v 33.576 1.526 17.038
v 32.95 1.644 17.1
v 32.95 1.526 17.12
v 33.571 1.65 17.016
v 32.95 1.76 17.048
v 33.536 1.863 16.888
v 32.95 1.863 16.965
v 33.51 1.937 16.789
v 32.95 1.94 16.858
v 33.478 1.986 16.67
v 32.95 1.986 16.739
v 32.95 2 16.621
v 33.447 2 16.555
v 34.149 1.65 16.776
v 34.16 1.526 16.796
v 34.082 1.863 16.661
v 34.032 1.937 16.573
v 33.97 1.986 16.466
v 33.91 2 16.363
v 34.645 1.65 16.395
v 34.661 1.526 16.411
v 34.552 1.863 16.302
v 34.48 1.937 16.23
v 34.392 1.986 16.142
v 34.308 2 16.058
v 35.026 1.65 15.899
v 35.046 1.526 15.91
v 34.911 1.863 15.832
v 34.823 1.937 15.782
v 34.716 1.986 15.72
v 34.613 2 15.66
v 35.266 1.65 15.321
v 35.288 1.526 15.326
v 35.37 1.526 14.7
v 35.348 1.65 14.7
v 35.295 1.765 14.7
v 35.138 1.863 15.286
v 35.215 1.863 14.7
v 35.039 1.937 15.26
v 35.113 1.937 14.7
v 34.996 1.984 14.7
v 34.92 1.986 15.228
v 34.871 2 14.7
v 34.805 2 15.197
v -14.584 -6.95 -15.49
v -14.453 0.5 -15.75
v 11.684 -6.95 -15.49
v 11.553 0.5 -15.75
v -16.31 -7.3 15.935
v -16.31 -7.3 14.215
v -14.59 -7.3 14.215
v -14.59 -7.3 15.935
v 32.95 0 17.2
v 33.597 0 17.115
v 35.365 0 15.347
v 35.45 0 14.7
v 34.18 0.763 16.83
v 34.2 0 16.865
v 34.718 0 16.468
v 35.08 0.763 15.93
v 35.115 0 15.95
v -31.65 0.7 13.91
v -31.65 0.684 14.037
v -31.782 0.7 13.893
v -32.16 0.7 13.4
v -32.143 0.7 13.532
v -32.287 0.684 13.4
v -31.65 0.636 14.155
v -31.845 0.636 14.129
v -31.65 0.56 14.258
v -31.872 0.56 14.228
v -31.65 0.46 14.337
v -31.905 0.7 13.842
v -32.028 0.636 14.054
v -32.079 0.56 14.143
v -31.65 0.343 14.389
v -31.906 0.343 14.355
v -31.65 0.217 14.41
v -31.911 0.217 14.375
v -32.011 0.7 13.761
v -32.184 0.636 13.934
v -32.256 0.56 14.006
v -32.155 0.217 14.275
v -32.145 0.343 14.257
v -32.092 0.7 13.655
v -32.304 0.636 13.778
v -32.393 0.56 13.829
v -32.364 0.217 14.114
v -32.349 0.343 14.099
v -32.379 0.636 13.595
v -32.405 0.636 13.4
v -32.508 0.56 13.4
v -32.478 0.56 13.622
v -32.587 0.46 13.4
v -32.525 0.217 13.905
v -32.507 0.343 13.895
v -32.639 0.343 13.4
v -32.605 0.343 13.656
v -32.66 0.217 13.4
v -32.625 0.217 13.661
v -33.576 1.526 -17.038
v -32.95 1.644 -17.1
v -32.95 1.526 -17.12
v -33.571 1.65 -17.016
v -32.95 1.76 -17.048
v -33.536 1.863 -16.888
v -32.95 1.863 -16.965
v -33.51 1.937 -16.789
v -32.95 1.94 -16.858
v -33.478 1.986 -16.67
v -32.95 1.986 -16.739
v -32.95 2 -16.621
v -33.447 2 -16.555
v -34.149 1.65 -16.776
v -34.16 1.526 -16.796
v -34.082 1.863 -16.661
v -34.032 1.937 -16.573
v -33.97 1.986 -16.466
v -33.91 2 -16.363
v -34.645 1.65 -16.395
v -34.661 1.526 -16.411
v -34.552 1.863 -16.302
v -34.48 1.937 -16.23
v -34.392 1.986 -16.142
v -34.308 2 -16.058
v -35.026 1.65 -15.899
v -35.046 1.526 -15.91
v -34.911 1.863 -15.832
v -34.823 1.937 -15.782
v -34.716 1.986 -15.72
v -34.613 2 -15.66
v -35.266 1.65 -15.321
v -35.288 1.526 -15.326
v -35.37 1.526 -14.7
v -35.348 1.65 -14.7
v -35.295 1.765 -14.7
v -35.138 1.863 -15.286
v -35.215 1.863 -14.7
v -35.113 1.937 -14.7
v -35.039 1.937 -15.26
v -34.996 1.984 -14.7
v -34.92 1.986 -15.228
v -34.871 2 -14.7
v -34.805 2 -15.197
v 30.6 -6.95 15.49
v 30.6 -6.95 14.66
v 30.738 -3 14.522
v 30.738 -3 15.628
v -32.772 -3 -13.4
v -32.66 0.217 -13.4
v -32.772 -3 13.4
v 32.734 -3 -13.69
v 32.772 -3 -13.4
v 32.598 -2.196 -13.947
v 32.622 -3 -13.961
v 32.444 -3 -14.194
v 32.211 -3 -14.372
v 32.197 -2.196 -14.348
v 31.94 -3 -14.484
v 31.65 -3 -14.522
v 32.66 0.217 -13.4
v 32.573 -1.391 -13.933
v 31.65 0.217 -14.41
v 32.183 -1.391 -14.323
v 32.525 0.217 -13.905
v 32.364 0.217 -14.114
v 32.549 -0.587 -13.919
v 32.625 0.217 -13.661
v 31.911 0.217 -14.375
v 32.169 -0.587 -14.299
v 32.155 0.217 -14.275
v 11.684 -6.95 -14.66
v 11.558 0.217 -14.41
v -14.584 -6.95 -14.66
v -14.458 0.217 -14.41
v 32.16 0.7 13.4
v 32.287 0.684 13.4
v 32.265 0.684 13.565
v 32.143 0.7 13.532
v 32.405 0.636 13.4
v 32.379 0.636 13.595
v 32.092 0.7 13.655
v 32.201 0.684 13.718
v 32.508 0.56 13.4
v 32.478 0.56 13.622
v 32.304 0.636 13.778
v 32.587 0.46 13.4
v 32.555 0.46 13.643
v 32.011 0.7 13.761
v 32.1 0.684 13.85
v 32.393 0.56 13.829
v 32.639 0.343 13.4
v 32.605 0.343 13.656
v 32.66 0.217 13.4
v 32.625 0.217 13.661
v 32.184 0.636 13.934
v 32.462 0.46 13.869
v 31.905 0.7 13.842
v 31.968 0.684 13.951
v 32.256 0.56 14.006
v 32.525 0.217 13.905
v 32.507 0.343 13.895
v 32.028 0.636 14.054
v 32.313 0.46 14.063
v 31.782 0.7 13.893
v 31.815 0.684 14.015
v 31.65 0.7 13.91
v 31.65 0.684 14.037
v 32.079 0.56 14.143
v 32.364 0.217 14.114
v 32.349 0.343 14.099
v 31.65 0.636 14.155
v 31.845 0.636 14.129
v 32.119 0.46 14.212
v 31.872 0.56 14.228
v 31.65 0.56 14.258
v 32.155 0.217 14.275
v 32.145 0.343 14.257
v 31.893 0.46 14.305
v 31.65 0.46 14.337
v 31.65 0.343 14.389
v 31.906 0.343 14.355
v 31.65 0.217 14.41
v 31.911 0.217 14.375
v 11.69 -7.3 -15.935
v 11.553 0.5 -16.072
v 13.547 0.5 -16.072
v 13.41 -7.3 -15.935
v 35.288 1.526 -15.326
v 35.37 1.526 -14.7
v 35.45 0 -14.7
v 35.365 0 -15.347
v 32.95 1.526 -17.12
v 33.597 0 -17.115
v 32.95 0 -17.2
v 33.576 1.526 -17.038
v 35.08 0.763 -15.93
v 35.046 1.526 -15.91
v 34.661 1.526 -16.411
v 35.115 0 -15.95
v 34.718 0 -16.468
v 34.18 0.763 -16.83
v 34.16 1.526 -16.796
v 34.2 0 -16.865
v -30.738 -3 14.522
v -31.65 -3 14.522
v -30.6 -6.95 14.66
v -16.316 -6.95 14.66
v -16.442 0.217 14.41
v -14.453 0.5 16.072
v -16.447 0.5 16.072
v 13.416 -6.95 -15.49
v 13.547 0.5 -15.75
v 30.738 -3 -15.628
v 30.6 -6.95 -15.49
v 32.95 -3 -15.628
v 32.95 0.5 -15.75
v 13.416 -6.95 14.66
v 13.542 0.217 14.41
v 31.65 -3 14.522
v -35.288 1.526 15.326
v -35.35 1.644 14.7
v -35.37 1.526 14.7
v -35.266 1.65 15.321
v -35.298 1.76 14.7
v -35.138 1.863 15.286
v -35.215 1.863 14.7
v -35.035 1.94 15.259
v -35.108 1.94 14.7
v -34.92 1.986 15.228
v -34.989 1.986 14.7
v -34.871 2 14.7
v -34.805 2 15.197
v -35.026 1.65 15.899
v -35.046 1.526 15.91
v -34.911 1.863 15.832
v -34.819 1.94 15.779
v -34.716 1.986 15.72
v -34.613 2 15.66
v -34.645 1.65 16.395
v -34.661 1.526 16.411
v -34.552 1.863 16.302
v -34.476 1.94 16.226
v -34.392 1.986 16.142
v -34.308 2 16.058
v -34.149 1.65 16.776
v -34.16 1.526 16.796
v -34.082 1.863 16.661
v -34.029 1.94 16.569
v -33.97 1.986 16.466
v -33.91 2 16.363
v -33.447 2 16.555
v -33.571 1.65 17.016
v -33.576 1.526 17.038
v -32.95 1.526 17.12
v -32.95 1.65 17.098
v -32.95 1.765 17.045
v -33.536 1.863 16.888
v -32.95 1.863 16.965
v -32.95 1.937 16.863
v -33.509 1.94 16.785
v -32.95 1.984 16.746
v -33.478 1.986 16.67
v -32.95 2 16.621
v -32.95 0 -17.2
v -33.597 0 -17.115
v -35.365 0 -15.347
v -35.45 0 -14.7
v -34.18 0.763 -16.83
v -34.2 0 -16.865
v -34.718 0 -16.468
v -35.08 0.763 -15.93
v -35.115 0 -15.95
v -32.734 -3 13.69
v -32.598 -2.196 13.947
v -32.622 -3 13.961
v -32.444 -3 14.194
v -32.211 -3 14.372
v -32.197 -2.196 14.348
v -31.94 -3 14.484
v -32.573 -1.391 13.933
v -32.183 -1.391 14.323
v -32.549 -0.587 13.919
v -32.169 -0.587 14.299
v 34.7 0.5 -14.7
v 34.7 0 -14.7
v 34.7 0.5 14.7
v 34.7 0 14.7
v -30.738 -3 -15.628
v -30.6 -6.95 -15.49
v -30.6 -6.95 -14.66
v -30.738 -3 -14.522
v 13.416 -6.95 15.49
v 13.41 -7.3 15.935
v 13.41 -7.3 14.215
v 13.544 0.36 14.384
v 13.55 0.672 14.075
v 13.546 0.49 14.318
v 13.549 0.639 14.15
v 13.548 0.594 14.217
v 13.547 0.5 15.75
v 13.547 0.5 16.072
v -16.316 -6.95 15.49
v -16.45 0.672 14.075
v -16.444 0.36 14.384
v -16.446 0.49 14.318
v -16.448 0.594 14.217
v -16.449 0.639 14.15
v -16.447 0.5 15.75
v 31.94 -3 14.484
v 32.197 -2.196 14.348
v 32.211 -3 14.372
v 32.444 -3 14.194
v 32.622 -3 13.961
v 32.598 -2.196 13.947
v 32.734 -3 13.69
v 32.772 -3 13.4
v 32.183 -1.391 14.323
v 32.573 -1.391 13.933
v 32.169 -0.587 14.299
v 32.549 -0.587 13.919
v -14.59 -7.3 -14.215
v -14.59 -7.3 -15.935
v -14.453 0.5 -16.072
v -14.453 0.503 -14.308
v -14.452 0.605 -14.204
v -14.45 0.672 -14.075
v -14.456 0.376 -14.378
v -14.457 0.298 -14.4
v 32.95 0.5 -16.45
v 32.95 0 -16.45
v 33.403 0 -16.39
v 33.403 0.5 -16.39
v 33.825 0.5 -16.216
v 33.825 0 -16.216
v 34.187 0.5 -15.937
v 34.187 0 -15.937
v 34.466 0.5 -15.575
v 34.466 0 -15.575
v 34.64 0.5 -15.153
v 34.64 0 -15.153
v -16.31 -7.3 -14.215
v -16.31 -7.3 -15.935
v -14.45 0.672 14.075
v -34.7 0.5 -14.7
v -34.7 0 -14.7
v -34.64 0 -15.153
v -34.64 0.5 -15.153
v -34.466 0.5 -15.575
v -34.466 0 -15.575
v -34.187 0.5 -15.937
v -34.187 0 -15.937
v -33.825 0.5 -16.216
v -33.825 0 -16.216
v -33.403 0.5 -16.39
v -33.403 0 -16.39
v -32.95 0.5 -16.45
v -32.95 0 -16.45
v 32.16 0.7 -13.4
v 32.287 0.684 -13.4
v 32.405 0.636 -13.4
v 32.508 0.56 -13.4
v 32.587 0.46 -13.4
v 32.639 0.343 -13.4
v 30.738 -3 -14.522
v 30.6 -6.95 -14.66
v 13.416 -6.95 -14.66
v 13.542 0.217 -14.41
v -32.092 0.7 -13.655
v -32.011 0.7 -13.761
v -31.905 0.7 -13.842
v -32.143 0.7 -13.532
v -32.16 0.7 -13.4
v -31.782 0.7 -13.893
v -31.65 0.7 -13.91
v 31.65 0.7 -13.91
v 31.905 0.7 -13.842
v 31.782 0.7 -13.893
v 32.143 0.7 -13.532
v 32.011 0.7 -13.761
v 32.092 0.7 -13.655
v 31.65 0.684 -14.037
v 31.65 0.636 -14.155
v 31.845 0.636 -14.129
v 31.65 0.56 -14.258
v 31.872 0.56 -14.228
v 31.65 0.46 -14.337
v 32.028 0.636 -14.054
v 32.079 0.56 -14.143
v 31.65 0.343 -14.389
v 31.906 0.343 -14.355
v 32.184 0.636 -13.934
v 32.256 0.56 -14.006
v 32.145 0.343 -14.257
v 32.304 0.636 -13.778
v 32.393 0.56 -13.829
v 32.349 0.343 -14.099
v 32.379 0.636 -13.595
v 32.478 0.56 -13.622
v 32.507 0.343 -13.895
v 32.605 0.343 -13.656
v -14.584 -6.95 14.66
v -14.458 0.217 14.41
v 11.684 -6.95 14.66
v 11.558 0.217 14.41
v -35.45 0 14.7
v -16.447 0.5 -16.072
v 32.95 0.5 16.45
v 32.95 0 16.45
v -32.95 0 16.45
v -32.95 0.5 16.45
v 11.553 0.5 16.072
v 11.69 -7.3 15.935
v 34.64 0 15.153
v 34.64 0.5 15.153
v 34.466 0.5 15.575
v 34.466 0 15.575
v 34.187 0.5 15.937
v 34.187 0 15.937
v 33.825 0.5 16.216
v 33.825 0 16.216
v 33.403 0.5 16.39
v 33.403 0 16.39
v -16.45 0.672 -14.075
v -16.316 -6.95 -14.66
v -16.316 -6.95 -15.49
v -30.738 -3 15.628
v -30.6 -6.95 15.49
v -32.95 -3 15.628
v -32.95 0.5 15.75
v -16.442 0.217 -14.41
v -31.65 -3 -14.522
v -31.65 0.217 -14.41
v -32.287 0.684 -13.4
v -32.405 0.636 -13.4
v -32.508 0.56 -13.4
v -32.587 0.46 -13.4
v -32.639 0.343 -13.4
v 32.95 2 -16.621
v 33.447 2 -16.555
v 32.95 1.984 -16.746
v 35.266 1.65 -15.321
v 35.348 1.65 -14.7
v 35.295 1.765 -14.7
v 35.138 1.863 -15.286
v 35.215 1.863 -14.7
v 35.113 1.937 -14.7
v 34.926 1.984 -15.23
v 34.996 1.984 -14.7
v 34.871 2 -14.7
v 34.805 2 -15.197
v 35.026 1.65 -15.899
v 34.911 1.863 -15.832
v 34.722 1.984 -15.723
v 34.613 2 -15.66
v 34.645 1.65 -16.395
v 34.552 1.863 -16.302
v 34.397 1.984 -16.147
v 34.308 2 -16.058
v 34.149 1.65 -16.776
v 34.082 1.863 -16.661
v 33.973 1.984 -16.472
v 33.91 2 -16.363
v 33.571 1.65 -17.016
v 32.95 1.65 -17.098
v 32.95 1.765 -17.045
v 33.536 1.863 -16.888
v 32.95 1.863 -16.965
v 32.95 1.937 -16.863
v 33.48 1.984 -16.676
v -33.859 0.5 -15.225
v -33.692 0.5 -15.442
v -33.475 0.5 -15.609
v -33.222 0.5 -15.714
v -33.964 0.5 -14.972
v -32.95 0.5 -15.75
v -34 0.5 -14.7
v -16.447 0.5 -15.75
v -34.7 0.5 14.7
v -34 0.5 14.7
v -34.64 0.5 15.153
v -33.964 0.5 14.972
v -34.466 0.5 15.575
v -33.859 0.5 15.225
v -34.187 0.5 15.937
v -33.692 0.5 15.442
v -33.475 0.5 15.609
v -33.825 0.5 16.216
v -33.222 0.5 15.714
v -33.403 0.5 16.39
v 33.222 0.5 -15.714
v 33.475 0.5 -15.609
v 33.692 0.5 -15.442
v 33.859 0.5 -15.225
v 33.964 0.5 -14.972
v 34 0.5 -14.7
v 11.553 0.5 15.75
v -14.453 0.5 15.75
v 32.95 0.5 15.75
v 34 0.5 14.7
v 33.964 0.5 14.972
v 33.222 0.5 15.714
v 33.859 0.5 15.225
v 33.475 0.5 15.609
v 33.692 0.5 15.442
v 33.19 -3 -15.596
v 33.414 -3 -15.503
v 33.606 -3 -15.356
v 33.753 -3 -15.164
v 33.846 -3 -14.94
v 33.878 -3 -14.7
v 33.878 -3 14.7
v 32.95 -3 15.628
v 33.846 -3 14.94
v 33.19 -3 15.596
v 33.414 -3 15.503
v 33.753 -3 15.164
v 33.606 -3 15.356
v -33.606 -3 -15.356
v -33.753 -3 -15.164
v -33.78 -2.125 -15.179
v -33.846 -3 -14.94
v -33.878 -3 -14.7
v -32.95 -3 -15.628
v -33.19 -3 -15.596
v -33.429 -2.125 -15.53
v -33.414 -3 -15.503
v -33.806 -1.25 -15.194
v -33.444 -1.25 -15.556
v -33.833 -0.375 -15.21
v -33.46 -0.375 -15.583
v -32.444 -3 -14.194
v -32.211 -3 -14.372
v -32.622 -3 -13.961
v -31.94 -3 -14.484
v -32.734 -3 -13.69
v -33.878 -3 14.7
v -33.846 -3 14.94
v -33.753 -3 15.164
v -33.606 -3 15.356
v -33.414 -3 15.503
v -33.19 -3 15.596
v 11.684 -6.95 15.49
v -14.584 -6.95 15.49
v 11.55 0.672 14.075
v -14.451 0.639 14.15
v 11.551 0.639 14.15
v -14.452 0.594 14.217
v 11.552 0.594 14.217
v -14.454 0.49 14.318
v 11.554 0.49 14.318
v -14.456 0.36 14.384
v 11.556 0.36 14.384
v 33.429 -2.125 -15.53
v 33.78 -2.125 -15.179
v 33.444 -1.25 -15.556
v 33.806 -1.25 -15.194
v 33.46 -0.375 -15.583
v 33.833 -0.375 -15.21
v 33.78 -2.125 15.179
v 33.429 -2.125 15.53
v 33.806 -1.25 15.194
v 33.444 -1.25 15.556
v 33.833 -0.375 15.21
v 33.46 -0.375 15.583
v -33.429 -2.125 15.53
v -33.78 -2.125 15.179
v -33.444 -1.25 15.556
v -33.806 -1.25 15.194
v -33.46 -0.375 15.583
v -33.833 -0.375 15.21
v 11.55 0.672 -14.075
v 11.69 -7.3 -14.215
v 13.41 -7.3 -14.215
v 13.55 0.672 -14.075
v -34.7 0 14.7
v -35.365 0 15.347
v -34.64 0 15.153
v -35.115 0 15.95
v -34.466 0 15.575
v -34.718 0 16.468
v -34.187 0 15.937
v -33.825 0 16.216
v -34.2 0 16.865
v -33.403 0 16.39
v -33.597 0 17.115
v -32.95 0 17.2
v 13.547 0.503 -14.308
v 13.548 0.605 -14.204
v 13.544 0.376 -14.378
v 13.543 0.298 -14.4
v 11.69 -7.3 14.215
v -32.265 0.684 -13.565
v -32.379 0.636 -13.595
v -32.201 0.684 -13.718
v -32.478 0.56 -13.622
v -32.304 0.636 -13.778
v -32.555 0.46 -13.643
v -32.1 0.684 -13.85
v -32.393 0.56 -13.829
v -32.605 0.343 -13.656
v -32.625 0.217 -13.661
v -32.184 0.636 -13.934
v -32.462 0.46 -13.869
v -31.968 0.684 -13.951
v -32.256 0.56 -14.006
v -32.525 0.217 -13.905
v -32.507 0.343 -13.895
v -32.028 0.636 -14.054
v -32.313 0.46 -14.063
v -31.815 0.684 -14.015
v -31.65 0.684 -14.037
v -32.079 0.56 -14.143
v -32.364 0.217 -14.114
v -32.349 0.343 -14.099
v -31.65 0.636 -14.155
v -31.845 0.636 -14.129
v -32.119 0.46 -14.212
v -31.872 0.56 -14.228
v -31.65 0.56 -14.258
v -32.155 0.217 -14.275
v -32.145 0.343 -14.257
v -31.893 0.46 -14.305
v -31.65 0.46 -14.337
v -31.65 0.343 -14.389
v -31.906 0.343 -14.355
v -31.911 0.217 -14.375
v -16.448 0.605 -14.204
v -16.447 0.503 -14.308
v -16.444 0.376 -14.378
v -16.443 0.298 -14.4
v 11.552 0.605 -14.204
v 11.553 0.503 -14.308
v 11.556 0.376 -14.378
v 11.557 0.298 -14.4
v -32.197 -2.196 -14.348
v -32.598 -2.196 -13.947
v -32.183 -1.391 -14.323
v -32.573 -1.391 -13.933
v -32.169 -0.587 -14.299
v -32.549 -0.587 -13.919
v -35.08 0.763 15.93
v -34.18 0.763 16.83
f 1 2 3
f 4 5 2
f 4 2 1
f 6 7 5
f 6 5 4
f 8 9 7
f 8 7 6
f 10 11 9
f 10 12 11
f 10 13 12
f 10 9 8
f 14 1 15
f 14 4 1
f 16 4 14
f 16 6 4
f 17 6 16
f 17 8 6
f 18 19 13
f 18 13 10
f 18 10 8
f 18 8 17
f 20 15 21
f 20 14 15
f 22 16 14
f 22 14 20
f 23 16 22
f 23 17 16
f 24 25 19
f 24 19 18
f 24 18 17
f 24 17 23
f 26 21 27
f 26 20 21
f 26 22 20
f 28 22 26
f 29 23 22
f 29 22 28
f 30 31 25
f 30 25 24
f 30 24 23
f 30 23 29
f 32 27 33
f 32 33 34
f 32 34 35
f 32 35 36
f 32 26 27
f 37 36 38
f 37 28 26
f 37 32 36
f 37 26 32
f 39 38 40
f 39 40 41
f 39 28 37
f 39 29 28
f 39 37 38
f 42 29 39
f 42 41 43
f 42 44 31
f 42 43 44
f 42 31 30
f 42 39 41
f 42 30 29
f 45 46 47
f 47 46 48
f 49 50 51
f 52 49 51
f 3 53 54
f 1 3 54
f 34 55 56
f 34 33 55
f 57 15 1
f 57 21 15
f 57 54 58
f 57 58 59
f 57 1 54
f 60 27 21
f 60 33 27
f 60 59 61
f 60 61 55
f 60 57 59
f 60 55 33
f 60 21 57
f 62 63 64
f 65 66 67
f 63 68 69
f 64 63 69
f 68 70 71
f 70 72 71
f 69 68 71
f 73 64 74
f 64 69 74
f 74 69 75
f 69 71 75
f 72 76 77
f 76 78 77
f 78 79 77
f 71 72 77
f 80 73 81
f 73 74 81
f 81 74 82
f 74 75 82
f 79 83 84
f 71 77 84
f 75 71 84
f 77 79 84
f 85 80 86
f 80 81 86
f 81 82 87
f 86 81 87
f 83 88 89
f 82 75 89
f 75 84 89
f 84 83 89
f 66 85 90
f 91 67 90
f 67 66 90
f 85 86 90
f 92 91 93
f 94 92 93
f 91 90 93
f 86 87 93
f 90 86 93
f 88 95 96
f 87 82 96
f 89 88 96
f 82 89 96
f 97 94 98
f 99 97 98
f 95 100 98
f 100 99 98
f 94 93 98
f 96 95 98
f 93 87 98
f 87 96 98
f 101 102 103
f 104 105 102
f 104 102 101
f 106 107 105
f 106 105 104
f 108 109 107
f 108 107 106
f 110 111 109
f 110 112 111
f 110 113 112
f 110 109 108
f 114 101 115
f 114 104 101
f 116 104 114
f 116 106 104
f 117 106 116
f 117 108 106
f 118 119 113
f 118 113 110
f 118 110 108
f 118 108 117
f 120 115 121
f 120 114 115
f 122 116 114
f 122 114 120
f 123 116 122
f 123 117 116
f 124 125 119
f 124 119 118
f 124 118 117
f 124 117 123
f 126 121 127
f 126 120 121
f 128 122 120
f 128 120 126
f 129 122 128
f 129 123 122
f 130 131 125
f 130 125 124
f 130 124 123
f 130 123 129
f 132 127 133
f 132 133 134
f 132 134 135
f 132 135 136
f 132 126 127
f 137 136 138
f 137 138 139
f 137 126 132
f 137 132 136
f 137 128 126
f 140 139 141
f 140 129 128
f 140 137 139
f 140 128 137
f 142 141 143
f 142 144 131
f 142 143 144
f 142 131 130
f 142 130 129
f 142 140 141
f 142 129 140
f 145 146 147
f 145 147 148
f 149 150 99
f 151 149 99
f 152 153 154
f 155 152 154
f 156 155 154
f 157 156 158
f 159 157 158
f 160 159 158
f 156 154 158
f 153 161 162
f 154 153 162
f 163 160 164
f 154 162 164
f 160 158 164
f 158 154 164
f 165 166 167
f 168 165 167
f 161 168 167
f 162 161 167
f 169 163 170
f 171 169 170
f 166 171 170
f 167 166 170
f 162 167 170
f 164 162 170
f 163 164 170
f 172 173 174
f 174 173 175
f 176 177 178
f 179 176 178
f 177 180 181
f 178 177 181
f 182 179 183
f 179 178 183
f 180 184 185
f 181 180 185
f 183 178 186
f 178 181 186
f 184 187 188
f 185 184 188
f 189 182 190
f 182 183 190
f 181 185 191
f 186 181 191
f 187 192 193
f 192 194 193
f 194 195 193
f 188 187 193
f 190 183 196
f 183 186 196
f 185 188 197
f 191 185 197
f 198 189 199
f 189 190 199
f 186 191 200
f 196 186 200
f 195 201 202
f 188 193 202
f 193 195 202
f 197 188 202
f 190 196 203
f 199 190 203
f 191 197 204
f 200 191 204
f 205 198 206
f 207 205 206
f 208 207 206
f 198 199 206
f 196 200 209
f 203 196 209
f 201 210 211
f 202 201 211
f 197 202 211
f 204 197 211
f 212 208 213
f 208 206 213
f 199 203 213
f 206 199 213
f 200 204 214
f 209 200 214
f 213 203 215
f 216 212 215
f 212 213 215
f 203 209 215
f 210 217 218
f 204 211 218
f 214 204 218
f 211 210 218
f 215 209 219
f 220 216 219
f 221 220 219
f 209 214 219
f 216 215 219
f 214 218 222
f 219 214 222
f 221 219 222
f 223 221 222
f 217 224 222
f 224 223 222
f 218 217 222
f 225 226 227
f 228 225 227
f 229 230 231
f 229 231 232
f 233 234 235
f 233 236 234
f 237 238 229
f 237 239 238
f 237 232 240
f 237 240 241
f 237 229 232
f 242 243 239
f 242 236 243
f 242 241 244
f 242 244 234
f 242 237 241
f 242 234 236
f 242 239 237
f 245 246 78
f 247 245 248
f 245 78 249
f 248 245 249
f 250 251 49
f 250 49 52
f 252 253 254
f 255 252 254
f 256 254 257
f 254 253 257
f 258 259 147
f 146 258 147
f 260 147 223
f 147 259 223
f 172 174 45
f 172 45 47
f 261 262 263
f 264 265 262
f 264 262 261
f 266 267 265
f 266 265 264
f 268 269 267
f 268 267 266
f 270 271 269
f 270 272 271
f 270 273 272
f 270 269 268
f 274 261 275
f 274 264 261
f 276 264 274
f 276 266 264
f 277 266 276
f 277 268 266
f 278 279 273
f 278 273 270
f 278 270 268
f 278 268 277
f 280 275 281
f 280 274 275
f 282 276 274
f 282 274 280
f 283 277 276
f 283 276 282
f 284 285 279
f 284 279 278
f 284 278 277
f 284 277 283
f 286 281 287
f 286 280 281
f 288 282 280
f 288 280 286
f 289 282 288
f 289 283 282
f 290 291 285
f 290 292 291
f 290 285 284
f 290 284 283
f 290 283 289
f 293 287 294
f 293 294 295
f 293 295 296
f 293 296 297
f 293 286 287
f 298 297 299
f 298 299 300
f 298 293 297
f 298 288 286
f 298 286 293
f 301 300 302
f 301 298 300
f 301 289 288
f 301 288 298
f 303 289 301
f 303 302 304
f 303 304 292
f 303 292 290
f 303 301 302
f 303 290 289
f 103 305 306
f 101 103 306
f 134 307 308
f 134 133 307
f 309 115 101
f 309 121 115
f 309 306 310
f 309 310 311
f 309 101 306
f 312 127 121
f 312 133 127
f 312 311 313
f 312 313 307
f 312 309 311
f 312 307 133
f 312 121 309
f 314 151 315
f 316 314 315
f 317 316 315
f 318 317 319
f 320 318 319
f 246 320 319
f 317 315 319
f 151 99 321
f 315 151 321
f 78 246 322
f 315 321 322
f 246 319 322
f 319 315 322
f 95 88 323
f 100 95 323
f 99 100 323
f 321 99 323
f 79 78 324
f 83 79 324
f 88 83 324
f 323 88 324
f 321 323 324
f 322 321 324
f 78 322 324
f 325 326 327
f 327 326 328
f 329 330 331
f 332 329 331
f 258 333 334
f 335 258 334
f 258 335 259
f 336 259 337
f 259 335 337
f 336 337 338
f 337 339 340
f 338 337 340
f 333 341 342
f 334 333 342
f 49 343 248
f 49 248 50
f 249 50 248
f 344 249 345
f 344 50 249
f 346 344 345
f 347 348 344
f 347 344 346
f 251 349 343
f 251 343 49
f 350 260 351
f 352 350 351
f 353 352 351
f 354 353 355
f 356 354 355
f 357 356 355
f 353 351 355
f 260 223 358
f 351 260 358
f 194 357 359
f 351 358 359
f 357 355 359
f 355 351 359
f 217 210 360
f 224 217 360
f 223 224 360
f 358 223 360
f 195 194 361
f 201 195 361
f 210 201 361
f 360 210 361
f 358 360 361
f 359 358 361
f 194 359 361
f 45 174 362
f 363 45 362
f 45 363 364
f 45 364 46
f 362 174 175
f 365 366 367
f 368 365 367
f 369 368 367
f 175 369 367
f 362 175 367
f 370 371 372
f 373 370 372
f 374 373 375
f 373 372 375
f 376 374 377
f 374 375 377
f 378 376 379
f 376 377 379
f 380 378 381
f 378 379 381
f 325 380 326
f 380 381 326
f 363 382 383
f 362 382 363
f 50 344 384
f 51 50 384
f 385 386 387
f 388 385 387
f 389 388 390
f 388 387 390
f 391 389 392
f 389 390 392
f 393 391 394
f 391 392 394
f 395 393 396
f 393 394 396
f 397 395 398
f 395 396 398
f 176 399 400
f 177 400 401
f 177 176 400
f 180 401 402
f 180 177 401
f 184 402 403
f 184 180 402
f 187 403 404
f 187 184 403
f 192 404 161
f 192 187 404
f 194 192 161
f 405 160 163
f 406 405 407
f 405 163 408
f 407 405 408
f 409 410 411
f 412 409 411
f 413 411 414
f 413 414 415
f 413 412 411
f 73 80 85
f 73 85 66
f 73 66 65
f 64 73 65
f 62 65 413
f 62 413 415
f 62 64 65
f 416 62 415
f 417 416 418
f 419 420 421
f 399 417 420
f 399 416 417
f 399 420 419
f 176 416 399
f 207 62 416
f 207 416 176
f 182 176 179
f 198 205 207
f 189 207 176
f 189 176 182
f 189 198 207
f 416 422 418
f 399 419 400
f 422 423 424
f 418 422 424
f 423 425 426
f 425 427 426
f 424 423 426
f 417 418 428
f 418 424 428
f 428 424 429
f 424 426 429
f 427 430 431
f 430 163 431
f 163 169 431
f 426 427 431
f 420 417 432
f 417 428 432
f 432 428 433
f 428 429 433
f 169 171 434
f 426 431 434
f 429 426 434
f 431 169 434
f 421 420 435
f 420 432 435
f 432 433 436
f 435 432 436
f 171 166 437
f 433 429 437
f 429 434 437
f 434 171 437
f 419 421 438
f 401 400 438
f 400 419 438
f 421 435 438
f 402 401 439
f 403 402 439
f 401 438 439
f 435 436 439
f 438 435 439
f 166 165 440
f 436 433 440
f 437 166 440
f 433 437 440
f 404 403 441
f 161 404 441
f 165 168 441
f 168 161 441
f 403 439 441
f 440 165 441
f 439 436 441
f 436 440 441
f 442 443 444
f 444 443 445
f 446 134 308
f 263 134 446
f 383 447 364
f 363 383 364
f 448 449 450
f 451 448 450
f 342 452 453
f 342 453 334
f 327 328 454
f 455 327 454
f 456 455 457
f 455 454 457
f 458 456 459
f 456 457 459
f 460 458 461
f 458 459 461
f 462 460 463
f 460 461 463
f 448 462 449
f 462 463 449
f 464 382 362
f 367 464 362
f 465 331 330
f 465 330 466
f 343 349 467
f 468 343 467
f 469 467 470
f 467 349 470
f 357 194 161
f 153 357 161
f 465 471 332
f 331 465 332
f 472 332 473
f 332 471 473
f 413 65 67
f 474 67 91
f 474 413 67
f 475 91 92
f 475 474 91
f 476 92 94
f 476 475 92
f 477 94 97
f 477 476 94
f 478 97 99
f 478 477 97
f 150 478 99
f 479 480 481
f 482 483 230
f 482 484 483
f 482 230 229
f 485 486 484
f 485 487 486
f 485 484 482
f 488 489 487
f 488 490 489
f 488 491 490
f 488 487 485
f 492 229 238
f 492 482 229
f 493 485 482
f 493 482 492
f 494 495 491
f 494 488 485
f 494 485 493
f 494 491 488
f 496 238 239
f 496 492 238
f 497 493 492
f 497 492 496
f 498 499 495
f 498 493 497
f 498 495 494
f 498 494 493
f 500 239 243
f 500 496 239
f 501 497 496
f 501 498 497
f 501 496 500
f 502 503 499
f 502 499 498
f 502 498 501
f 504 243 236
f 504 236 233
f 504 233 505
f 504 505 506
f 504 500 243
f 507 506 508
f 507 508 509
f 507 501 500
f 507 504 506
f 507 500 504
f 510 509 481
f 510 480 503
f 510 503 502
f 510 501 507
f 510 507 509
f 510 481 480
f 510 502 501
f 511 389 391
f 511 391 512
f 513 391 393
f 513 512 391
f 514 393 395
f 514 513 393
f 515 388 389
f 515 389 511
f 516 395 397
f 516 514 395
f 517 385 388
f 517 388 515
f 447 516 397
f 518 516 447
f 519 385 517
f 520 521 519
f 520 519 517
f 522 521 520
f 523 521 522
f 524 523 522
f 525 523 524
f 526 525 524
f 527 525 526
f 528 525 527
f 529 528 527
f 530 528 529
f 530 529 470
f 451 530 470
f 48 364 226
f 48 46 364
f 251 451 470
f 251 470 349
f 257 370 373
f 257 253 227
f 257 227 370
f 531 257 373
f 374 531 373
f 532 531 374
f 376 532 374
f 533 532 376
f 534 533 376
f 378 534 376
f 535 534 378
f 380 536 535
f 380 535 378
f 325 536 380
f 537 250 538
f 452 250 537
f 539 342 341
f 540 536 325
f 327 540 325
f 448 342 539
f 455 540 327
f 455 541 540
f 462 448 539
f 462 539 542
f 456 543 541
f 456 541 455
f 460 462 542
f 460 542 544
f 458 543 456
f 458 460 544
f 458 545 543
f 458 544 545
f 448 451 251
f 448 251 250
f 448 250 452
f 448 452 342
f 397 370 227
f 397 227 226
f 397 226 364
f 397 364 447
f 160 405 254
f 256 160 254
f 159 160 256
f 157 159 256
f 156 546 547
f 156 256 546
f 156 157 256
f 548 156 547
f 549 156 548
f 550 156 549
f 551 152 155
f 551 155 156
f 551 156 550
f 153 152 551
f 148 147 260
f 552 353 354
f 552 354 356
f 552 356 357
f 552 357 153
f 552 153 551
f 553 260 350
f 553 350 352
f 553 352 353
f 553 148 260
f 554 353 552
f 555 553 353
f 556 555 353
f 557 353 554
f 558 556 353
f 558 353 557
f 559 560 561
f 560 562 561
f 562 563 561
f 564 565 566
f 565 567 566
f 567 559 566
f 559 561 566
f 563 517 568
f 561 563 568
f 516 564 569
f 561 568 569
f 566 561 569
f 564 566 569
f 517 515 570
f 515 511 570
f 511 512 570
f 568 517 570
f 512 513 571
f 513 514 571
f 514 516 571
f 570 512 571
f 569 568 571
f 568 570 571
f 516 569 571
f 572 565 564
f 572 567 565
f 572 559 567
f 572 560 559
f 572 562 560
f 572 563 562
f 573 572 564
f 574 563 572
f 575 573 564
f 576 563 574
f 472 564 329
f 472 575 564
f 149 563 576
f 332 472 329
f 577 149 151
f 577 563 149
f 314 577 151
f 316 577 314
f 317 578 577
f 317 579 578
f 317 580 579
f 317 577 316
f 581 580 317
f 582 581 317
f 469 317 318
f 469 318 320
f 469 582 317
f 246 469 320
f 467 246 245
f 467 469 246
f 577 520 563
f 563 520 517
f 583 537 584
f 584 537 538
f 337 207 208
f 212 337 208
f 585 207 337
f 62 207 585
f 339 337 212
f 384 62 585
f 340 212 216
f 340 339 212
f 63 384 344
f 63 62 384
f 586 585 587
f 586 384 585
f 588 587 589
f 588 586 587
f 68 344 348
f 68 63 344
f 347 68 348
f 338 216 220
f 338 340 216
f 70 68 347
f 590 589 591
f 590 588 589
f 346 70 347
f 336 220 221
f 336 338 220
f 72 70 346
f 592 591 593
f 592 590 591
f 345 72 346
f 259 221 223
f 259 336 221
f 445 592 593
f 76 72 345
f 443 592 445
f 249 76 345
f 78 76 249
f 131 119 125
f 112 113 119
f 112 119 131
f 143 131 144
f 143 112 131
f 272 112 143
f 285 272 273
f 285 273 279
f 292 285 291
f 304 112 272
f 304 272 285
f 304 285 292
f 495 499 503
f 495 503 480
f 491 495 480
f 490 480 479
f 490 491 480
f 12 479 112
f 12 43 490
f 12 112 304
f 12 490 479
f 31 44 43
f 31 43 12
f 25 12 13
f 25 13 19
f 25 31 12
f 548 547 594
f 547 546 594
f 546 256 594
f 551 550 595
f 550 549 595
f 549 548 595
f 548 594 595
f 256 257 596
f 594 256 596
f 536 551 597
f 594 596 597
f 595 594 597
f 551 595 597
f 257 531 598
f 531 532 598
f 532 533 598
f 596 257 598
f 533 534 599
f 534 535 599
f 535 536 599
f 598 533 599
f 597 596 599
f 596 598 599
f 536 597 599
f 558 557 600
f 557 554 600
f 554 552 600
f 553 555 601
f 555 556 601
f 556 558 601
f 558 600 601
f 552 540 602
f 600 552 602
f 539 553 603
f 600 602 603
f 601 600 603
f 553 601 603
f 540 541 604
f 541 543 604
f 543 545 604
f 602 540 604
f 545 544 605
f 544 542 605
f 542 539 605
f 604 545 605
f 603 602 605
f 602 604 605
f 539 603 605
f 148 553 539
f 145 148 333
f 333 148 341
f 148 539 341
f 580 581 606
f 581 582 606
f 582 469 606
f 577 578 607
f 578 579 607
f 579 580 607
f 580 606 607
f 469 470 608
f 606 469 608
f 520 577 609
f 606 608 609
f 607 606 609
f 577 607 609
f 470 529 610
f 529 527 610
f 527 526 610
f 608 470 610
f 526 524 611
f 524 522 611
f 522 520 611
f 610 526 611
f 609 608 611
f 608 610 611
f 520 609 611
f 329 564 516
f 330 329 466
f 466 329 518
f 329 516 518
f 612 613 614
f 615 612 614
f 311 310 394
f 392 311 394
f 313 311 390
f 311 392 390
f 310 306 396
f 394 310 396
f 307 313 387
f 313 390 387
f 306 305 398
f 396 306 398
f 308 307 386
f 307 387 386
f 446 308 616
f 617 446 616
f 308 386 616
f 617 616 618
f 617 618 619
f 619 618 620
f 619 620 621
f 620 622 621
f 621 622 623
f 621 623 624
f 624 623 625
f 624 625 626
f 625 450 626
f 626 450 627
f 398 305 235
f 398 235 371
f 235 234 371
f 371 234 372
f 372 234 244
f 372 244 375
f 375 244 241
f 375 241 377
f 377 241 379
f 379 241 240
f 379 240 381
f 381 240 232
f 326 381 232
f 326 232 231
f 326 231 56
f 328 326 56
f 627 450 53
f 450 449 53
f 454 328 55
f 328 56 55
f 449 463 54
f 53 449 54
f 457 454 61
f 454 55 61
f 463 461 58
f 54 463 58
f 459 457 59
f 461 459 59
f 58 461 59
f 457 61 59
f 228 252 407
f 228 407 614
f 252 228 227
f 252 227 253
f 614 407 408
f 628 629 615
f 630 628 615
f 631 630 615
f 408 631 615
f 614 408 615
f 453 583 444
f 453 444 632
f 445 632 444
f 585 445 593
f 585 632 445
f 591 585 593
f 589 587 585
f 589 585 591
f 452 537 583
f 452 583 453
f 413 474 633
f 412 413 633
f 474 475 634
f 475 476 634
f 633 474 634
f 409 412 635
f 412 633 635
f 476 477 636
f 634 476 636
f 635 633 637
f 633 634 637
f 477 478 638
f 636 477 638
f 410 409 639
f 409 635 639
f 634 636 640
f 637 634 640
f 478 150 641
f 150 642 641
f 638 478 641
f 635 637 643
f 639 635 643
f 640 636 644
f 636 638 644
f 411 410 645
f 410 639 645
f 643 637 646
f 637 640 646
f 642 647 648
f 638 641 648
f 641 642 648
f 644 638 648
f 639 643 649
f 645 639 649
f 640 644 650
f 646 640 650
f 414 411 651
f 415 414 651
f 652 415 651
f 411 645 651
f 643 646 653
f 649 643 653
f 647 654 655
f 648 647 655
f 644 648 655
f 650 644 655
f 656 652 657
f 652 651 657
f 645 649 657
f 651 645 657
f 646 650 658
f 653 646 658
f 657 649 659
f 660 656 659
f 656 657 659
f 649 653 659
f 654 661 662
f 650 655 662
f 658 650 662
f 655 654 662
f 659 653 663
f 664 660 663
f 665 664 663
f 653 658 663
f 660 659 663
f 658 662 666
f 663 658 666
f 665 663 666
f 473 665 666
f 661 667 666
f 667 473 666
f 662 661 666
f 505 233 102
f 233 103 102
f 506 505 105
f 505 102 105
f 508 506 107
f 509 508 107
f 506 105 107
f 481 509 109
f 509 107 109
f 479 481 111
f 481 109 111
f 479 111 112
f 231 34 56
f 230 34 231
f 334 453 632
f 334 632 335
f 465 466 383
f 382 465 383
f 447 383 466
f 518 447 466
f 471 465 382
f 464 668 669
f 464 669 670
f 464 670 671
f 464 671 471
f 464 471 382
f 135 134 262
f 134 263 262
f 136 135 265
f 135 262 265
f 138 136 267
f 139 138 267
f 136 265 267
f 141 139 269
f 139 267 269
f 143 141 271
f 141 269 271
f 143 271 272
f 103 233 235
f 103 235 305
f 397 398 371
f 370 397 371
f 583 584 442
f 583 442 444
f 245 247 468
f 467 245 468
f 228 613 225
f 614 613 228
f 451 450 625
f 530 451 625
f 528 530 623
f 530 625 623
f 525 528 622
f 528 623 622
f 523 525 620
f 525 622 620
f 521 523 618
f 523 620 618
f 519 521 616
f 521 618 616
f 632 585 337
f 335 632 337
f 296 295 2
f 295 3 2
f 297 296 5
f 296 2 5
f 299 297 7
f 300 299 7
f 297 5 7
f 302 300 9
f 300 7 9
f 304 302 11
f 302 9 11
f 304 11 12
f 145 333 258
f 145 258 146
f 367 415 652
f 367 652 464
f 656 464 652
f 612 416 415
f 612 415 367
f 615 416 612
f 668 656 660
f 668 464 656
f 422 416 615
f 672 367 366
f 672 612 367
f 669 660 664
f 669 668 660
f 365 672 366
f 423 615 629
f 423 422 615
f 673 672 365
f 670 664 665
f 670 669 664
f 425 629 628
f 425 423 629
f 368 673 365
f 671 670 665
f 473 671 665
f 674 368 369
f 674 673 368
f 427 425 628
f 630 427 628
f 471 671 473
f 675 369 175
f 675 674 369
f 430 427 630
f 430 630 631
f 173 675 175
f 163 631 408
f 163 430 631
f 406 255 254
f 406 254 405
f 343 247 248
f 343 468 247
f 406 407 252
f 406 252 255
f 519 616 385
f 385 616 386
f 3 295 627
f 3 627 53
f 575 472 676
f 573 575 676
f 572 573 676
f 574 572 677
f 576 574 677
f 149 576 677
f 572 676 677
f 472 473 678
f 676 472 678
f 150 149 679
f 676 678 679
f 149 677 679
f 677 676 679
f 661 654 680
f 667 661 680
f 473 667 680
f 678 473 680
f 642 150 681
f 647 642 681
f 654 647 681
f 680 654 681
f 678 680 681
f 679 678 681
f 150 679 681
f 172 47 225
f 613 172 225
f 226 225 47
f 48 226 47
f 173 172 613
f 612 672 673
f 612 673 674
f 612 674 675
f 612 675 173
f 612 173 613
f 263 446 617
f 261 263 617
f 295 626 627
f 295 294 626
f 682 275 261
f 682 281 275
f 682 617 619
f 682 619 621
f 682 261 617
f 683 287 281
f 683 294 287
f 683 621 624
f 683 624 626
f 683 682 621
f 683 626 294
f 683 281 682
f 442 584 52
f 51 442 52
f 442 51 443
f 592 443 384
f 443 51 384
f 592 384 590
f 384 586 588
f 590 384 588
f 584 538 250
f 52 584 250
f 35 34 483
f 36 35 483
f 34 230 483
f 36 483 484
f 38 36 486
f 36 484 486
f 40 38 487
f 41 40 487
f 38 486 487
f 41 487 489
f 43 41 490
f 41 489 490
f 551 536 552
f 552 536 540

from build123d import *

# Parameters (mm, degrees)
BOSS_EXTRUDE1_DEPTH           = 2
BOSS_EXTRUDE1_TAPER           = 3
FILLET1_R                     = 0.5
CUT_EXTRUDE1_DEPTH            = 0.5
BOSS_EXTRUDE2_DEPTH           = 7.45
BOSS_EXTRUDE2_DRAFT           = 2
CUT_EXTRUDE2_DEPTH            = 0.2
CUT_EXTRUDE2_DRAFT            = -2
SKETCH7_W                     = 80
SKETCH7_H                     = 26.5
CUT_EXTRUDE3_DEPTH            = 3.95
SKETCH6_W                     = 5.817002818
SKETCH6_H                     = 5.817002818
CUT_EXTRUDE4_DEPTH            = 3.95
CUT_EXTRUDE4_DRAFT            = -2
CUT_EXTRUDE4_PROFILE_2_DEPTH  = 3.95
CUT_EXTRUDE4_PROFILE_2_DRAFT  = -2
CUT_EXTRUDE4_PROFILE_3_DEPTH  = 3.95
CUT_EXTRUDE4_PROFILE_3_DRAFT  = -2
CUT_EXTRUDE4_PROFILE_4_DEPTH  = 3.95
CUT_EXTRUDE4_PROFILE_4_DRAFT  = -2
FILLET3_R                     = 0.5
SKETCH16_W                    = 2
SKETCH16_H                    = 2
BOSS_EXTRUDE7_DEPTH           = 8
BOSS_EXTRUDE7_DRAFT           = 1
BOSS_EXTRUDE7_PROFILE_2_DEPTH = 8
BOSS_EXTRUDE7_PROFILE_2_DRAFT = 1
BOSS_EXTRUDE7_PROFILE_3_DEPTH = 8
BOSS_EXTRUDE7_PROFILE_3_DRAFT = 1
BOSS_EXTRUDE7_PROFILE_4_DEPTH = 8
BOSS_EXTRUDE7_PROFILE_4_DRAFT = 1


with BuildPart() as part:
    # Sketch1 → Boss-Extrude1 (new body)
    with BuildSketch(Plane(origin=(0, 0, 0), x_dir=(1, 0, 0), z_dir=(0, 1, 0))):
        with BuildLine():
            Line((-32.95, -17.2), (32.95, -17.2))
            ThreePointArc((32.95, -17.2), (34.717766953, -16.467766953), (35.45, -14.7))
            Line((35.45, -14.7), (35.45, 14.7))
            ThreePointArc((35.45, 14.7), (34.717766953, 16.467766953), (32.95, 17.2))
            Line((32.95, 17.2), (-32.95, 17.2))
            ThreePointArc((-32.95, 17.2), (-34.717766953, 16.467766953), (-35.45, 14.7))
            Line((-35.45, 14.7), (-35.45, -14.7))
            ThreePointArc((-35.45, -14.7), (-34.717766953, -16.467766953), (-32.95, -17.2))
        make_face()
    extrude(amount=BOSS_EXTRUDE1_DEPTH, taper=BOSS_EXTRUDE1_TAPER)

    # Fillet1
    fillet1_edges = [part.edges().sort_by_distance(p)[0] for p in [
        (34.643651161, 2, -16.393651161),
        (0, 2, -17.095184441),
        (-34.643651161, 2, -16.393651161),
        (-35.345184441, 2, 0),
        (-34.643651161, 2, 16.393651161),
        (0, 2, 17.095184441),
        (34.643651161, 2, 16.393651161),
        (35.345184441, 2, 0),
    ]]
    fillet(fillet1_edges, radius=FILLET1_R)

    # Sketch2 → Cut-Extrude1 (cut)
    with BuildSketch(Plane.XZ):
        with BuildLine():
            Line((32.95, 16.45), (-32.95, 16.45))
            ThreePointArc((-32.95, 16.45), (-34.187436867, 15.937436867), (-34.7, 14.7))
            Line((-34.7, 14.7), (-34.7, -14.7))
            ThreePointArc((-34.7, -14.7), (-34.187436867, -15.937436867), (-32.95, -16.45))
            Line((-32.95, -16.45), (32.95, -16.45))
            ThreePointArc((32.95, -16.45), (34.187436867, -15.937436867), (34.7, -14.7))
            Line((34.7, -14.7), (34.7, 14.7))
            ThreePointArc((34.7, 14.7), (34.187436867, 15.937436867), (32.95, 16.45))
        make_face()
    extrude(amount=-CUT_EXTRUDE1_DEPTH, mode=Mode.SUBTRACT)


with BuildPart() as boss_extrude2_tool:
    # Sketch4 → Boss-Extrude2 (with draft: the straight prism first)
    with BuildSketch(Plane.XZ.offset(-0.5)):
        with BuildLine():
            Line((32.95, 15.75), (-32.95, 15.75))
            ThreePointArc((-32.95, 15.75), (-33.69246212, 15.44246212), (-34, 14.7))
            Line((-34, 14.7), (-34, -14.7))
            ThreePointArc((-34, -14.7), (-33.69246212, -15.44246212), (-32.95, -15.75))
            Line((-32.95, -15.75), (32.95, -15.75))
            ThreePointArc((32.95, -15.75), (33.69246212, -15.44246212), (34, -14.7))
            Line((34, -14.7), (34, 14.7))
            ThreePointArc((34, 14.7), (33.69246212, 15.44246212), (32.95, 15.75))
        make_face()
        with BuildLine():
            Line((31.65, -14.4), (-31.65, -14.4))
            ThreePointArc((-31.65, -14.4), (-32.357106781, -14.107106781), (-32.65, -13.4))
            Line((-32.65, -13.4), (-32.65, 13.4))
            ThreePointArc((-32.65, 13.4), (-32.357106781, 14.107106781), (-31.65, 14.4))
            Line((-31.65, 14.4), (31.65, 14.4))
            ThreePointArc((31.65, 14.4), (32.357106781, 14.107106781), (32.65, 13.4))
            Line((32.65, 13.4), (32.65, -13.4))
            ThreePointArc((32.65, -13.4), (32.357106781, -14.107106781), (31.65, -14.4))
        make_face(mode=Mode.SUBTRACT)
    extrude(amount=BOSS_EXTRUDE2_DEPTH)
    # Boss-Extrude2: the draft: its side faces are tilted about the plane it starts from
    boss_extrude2_sides = [boss_extrude2_tool.faces().sort_by_distance(p)[0] for p in [
        (0, -3.225, 15.75),
        (-33.69246212, -3.225, 15.44246212),
        (-34, -3.225, 0),
        (-33.69246212, -3.225, -15.44246212),
        (0, -3.225, -15.75),
        (33.69246212, -3.225, -15.44246212),
        (34, -3.225, 0),
        (33.69246212, -3.225, 15.44246212),
        (0, -3.225, -14.4),
        (-32.357106781, -3.225, -14.107106781),
        (-32.65, -3.225, 0),
        (-32.357106781, -3.225, 14.107106781),
        (0, -3.225, 14.4),
        (32.357106781, -3.225, 14.107106781),
        (32.65, -3.225, 0),
        (32.357106781, -3.225, -14.107106781),
    ]]
    draft(boss_extrude2_sides, Plane.XZ.offset(-0.5), BOSS_EXTRUDE2_DRAFT)


with BuildPart() as part_1:
    add(part.part)

    # Boss-Extrude2: add boss_extrude2_tool
    add(boss_extrude2_tool.part)


with BuildPart() as cut_extrude2_tool:
    # Sketch5 → Cut-Extrude2 (with draft: the straight prism first)
    with BuildSketch(Plane.XZ.offset(-0.5)):
        with BuildLine():
            Line((31.65, 14.4), (-31.65, 14.4))
            ThreePointArc((-31.65, 14.4), (-32.357106781, 14.107106781), (-32.65, 13.4))
            Line((-32.65, 13.4), (-32.65, -13.4))
            ThreePointArc((-32.65, -13.4), (-32.357106781, -14.107106781), (-31.65, -14.4))
            Line((-31.65, -14.4), (31.65, -14.4))
            ThreePointArc((31.65, -14.4), (32.357106781, -14.107106781), (32.65, -13.4))
            Line((32.65, -13.4), (32.65, 13.4))
            ThreePointArc((32.65, 13.4), (32.357106781, 14.107106781), (31.65, 14.4))
        make_face()
    extrude(amount=-CUT_EXTRUDE2_DEPTH)
    # Cut-Extrude2: the draft: its side faces are tilted about the plane it starts from
    cut_extrude2_sides = [cut_extrude2_tool.faces().sort_by_distance(p)[0] for p in [
        (0, 0.6, 14.4),
        (-32.357106781, 0.6, 14.107106781),
        (-32.65, 0.6, 0),
        (-32.357106781, 0.6, -14.107106781),
        (0, 0.6, -14.4),
        (32.357106781, 0.6, -14.107106781),
        (32.65, 0.6, 0),
        (32.357106781, 0.6, 14.107106781),
    ]]
    draft(cut_extrude2_sides, Plane.XZ.offset(-0.5), CUT_EXTRUDE2_DRAFT)


with BuildPart() as part_2:
    add(part_1.part)

    # Cut-Extrude2: cut by cut_extrude2_tool
    add(cut_extrude2_tool.part, mode=Mode.SUBTRACT)

    # Sketch7 → Cut-Extrude3 (cut)
    with BuildSketch(Plane.XZ.offset(6.95)):
        Rectangle(SKETCH7_W, SKETCH7_H)
    extrude(amount=-CUT_EXTRUDE3_DEPTH, mode=Mode.SUBTRACT)


with BuildPart() as cut_extrude4_tool:
    # Sketch6 → Cut-Extrude4 (with draft: the straight prism first)
    with BuildSketch(Plane.XZ.offset(6.95)):
        with Locations((-33.508501409, 15.258501409)):
            Rectangle(SKETCH6_W, SKETCH6_H)
    extrude(amount=-CUT_EXTRUDE4_DEPTH)
    # Cut-Extrude4: the draft: its side faces are tilted about the plane it starts from
    cut_extrude4_sides = [cut_extrude4_tool.faces().sort_by_distance(p)[0] for p in [
        (-36.417002818, -4.975, 15.258501409),
        (-33.508501409, -4.975, 12.35),
        (-30.6, -4.975, 15.258501409),
        (-33.508501409, -4.975, 18.167002818),
    ]]
    draft(cut_extrude4_sides, Plane.XZ.offset(6.95), CUT_EXTRUDE4_DRAFT)


with BuildPart() as part_3:
    add(part_2.part)

    # Cut-Extrude4: cut by cut_extrude4_tool
    add(cut_extrude4_tool.part, mode=Mode.SUBTRACT)


with BuildPart() as cut_extrude4_profile_2_tool:
    # Sketch6 → Cut-Extrude4 profile 2 (with draft: the straight prism first)
    with BuildSketch(Plane.XZ.offset(6.95)):
        with Locations((33.508501409, 15.258501409)):
            Rectangle(SKETCH6_W, SKETCH6_H)
    extrude(amount=-CUT_EXTRUDE4_PROFILE_2_DEPTH)
    # Cut-Extrude4 profile 2: the draft: its side faces are tilted about the plane it starts from
    cut_extrude4_profile_2_sides = [cut_extrude4_profile_2_tool.faces().sort_by_distance(p)[0] for p in [
        (30.6, -4.975, 15.258501409),
        (33.508501409, -4.975, 12.35),
        (36.417002818, -4.975, 15.258501409),
        (33.508501409, -4.975, 18.167002818),
    ]]
    draft(cut_extrude4_profile_2_sides, Plane.XZ.offset(6.95), CUT_EXTRUDE4_PROFILE_2_DRAFT)


with BuildPart() as part_4:
    add(part_3.part)

    # Cut-Extrude4 profile 2: cut by cut_extrude4_profile_2_tool
    add(cut_extrude4_profile_2_tool.part, mode=Mode.SUBTRACT)


with BuildPart() as cut_extrude4_profile_3_tool:
    # Sketch6 → Cut-Extrude4 profile 3 (with draft: the straight prism first)
    with BuildSketch(Plane.XZ.offset(6.95)):
        with Locations((33.508501409, -15.258501409)):
            Rectangle(SKETCH6_W, SKETCH6_H)
    extrude(amount=-CUT_EXTRUDE4_PROFILE_3_DEPTH)
    # Cut-Extrude4 profile 3: the draft: its side faces are tilted about the plane it starts from
    cut_extrude4_profile_3_sides = [cut_extrude4_profile_3_tool.faces().sort_by_distance(p)[0] for p in [
        (36.417002818, -4.975, -15.258501409),
        (33.508501409, -4.975, -12.35),
        (30.6, -4.975, -15.258501409),
        (33.508501409, -4.975, -18.167002818),
    ]]
    draft(cut_extrude4_profile_3_sides, Plane.XZ.offset(6.95), CUT_EXTRUDE4_PROFILE_3_DRAFT)


with BuildPart() as part_5:
    add(part_4.part)

    # Cut-Extrude4 profile 3: cut by cut_extrude4_profile_3_tool
    add(cut_extrude4_profile_3_tool.part, mode=Mode.SUBTRACT)


with BuildPart() as cut_extrude4_profile_4_tool:
    # Sketch6 → Cut-Extrude4 profile 4 (with draft: the straight prism first)
    with BuildSketch(Plane.XZ.offset(6.95)):
        with Locations((-33.508501409, -15.258501409)):
            Rectangle(SKETCH6_W, SKETCH6_H)
    extrude(amount=-CUT_EXTRUDE4_PROFILE_4_DEPTH)
    # Cut-Extrude4 profile 4: the draft: its side faces are tilted about the plane it starts from
    cut_extrude4_profile_4_sides = [cut_extrude4_profile_4_tool.faces().sort_by_distance(p)[0] for p in [
        (-30.6, -4.975, -15.258501409),
        (-33.508501409, -4.975, -12.35),
        (-36.417002818, -4.975, -15.258501409),
        (-33.508501409, -4.975, -18.167002818),
    ]]
    draft(cut_extrude4_profile_4_sides, Plane.XZ.offset(6.95), CUT_EXTRUDE4_PROFILE_4_DRAFT)


with BuildPart() as part_6:
    add(part_5.part)

    # Cut-Extrude4 profile 4: cut by cut_extrude4_profile_4_tool
    add(cut_extrude4_profile_4_tool.part, mode=Mode.SUBTRACT)

    # Fillet3
    fillet3_edges = [part_6.edges().sort_by_distance(p)[0] for p in [
        (32.352168239, 0.7, 14.102168239),
        (32.643015846, 0.7, 0),
        (32.352168239, 0.7, -14.102168239),
        (0, 0.7, -14.393015846),
        (-32.352168239, 0.7, -14.102168239),
        (-32.643015846, 0.7, 0),
        (-32.352168239, 0.7, 14.102168239),
        (0, 0.7, 14.393015846),
    ]]
    fillet(fillet3_edges, radius=FILLET3_R)


with BuildPart() as boss_extrude7_tool:
    # Sketch16 → Boss-Extrude7 (with draft: the straight prism first)
    with BuildSketch(Plane.XZ.offset(-0.7)):
        with Locations((-15.45, 15.075)):
            Rectangle(SKETCH16_W, SKETCH16_H)
    extrude(amount=BOSS_EXTRUDE7_DEPTH)
    # Boss-Extrude7: the draft: its side faces are tilted about the plane it starts from
    boss_extrude7_sides = [boss_extrude7_tool.faces().sort_by_distance(p)[0] for p in [
        (-15.45, -3.3, 14.075),
        (-14.45, -3.3, 15.075),
        (-15.45, -3.3, 16.075),
        (-16.45, -3.3, 15.075),
    ]]
    draft(boss_extrude7_sides, Plane.XZ.offset(-0.7), BOSS_EXTRUDE7_DRAFT)


with BuildPart() as part_7:
    add(part_6.part)

    # Boss-Extrude7: add boss_extrude7_tool
    add(boss_extrude7_tool.part)


with BuildPart() as boss_extrude7_profile_2_tool:
    # Sketch16 → Boss-Extrude7 profile 2 (with draft: the straight prism first)
    with BuildSketch(Plane.XZ.offset(-0.7)):
        with Locations((12.55, 15.075)):
            Rectangle(SKETCH16_W, SKETCH16_H)
    extrude(amount=BOSS_EXTRUDE7_PROFILE_2_DEPTH)
    # Boss-Extrude7 profile 2: the draft: its side faces are tilted about the plane it starts from
    boss_extrude7_profile_2_sides = [boss_extrude7_profile_2_tool.faces().sort_by_distance(p)[0] for p in [
        (12.55, -3.3, 14.075),
        (13.55, -3.3, 15.075),
        (12.55, -3.3, 16.075),
        (11.55, -3.3, 15.075),
    ]]
    draft(boss_extrude7_profile_2_sides, Plane.XZ.offset(-0.7), BOSS_EXTRUDE7_PROFILE_2_DRAFT)


with BuildPart() as part_8:
    add(part_7.part)

    # Boss-Extrude7 profile 2: add boss_extrude7_profile_2_tool
    add(boss_extrude7_profile_2_tool.part)


with BuildPart() as boss_extrude7_profile_3_tool:
    # Sketch16 → Boss-Extrude7 profile 3 (with draft: the straight prism first)
    with BuildSketch(Plane.XZ.offset(-0.7)):
        with Locations((12.55, -15.075)):
            Rectangle(SKETCH16_W, SKETCH16_H)
    extrude(amount=BOSS_EXTRUDE7_PROFILE_3_DEPTH)
    # Boss-Extrude7 profile 3: the draft: its side faces are tilted about the plane it starts from
    boss_extrude7_profile_3_sides = [boss_extrude7_profile_3_tool.faces().sort_by_distance(p)[0] for p in [
        (12.55, -3.3, -14.075),
        (11.55, -3.3, -15.075),
        (12.55, -3.3, -16.075),
        (13.55, -3.3, -15.075),
    ]]
    draft(boss_extrude7_profile_3_sides, Plane.XZ.offset(-0.7), BOSS_EXTRUDE7_PROFILE_3_DRAFT)


with BuildPart() as part_9:
    add(part_8.part)

    # Boss-Extrude7 profile 3: add boss_extrude7_profile_3_tool
    add(boss_extrude7_profile_3_tool.part)


with BuildPart() as boss_extrude7_profile_4_tool:
    # Sketch16 → Boss-Extrude7 profile 4 (with draft: the straight prism first)
    with BuildSketch(Plane.XZ.offset(-0.7)):
        with Locations((-15.45, -15.075)):
            Rectangle(SKETCH16_W, SKETCH16_H)
    extrude(amount=BOSS_EXTRUDE7_PROFILE_4_DEPTH)
    # Boss-Extrude7 profile 4: the draft: its side faces are tilted about the plane it starts from
    boss_extrude7_profile_4_sides = [boss_extrude7_profile_4_tool.faces().sort_by_distance(p)[0] for p in [
        (-15.45, -3.3, -14.075),
        (-16.45, -3.3, -15.075),
        (-15.45, -3.3, -16.075),
        (-14.45, -3.3, -15.075),
    ]]
    draft(boss_extrude7_profile_4_sides, Plane.XZ.offset(-0.7), BOSS_EXTRUDE7_PROFILE_4_DRAFT)


with BuildPart() as part_10:
    add(part_9.part)

    # Boss-Extrude7 profile 4: add boss_extrude7_profile_4_tool
    add(boss_extrude7_profile_4_tool.part)


solid = part_10.part
